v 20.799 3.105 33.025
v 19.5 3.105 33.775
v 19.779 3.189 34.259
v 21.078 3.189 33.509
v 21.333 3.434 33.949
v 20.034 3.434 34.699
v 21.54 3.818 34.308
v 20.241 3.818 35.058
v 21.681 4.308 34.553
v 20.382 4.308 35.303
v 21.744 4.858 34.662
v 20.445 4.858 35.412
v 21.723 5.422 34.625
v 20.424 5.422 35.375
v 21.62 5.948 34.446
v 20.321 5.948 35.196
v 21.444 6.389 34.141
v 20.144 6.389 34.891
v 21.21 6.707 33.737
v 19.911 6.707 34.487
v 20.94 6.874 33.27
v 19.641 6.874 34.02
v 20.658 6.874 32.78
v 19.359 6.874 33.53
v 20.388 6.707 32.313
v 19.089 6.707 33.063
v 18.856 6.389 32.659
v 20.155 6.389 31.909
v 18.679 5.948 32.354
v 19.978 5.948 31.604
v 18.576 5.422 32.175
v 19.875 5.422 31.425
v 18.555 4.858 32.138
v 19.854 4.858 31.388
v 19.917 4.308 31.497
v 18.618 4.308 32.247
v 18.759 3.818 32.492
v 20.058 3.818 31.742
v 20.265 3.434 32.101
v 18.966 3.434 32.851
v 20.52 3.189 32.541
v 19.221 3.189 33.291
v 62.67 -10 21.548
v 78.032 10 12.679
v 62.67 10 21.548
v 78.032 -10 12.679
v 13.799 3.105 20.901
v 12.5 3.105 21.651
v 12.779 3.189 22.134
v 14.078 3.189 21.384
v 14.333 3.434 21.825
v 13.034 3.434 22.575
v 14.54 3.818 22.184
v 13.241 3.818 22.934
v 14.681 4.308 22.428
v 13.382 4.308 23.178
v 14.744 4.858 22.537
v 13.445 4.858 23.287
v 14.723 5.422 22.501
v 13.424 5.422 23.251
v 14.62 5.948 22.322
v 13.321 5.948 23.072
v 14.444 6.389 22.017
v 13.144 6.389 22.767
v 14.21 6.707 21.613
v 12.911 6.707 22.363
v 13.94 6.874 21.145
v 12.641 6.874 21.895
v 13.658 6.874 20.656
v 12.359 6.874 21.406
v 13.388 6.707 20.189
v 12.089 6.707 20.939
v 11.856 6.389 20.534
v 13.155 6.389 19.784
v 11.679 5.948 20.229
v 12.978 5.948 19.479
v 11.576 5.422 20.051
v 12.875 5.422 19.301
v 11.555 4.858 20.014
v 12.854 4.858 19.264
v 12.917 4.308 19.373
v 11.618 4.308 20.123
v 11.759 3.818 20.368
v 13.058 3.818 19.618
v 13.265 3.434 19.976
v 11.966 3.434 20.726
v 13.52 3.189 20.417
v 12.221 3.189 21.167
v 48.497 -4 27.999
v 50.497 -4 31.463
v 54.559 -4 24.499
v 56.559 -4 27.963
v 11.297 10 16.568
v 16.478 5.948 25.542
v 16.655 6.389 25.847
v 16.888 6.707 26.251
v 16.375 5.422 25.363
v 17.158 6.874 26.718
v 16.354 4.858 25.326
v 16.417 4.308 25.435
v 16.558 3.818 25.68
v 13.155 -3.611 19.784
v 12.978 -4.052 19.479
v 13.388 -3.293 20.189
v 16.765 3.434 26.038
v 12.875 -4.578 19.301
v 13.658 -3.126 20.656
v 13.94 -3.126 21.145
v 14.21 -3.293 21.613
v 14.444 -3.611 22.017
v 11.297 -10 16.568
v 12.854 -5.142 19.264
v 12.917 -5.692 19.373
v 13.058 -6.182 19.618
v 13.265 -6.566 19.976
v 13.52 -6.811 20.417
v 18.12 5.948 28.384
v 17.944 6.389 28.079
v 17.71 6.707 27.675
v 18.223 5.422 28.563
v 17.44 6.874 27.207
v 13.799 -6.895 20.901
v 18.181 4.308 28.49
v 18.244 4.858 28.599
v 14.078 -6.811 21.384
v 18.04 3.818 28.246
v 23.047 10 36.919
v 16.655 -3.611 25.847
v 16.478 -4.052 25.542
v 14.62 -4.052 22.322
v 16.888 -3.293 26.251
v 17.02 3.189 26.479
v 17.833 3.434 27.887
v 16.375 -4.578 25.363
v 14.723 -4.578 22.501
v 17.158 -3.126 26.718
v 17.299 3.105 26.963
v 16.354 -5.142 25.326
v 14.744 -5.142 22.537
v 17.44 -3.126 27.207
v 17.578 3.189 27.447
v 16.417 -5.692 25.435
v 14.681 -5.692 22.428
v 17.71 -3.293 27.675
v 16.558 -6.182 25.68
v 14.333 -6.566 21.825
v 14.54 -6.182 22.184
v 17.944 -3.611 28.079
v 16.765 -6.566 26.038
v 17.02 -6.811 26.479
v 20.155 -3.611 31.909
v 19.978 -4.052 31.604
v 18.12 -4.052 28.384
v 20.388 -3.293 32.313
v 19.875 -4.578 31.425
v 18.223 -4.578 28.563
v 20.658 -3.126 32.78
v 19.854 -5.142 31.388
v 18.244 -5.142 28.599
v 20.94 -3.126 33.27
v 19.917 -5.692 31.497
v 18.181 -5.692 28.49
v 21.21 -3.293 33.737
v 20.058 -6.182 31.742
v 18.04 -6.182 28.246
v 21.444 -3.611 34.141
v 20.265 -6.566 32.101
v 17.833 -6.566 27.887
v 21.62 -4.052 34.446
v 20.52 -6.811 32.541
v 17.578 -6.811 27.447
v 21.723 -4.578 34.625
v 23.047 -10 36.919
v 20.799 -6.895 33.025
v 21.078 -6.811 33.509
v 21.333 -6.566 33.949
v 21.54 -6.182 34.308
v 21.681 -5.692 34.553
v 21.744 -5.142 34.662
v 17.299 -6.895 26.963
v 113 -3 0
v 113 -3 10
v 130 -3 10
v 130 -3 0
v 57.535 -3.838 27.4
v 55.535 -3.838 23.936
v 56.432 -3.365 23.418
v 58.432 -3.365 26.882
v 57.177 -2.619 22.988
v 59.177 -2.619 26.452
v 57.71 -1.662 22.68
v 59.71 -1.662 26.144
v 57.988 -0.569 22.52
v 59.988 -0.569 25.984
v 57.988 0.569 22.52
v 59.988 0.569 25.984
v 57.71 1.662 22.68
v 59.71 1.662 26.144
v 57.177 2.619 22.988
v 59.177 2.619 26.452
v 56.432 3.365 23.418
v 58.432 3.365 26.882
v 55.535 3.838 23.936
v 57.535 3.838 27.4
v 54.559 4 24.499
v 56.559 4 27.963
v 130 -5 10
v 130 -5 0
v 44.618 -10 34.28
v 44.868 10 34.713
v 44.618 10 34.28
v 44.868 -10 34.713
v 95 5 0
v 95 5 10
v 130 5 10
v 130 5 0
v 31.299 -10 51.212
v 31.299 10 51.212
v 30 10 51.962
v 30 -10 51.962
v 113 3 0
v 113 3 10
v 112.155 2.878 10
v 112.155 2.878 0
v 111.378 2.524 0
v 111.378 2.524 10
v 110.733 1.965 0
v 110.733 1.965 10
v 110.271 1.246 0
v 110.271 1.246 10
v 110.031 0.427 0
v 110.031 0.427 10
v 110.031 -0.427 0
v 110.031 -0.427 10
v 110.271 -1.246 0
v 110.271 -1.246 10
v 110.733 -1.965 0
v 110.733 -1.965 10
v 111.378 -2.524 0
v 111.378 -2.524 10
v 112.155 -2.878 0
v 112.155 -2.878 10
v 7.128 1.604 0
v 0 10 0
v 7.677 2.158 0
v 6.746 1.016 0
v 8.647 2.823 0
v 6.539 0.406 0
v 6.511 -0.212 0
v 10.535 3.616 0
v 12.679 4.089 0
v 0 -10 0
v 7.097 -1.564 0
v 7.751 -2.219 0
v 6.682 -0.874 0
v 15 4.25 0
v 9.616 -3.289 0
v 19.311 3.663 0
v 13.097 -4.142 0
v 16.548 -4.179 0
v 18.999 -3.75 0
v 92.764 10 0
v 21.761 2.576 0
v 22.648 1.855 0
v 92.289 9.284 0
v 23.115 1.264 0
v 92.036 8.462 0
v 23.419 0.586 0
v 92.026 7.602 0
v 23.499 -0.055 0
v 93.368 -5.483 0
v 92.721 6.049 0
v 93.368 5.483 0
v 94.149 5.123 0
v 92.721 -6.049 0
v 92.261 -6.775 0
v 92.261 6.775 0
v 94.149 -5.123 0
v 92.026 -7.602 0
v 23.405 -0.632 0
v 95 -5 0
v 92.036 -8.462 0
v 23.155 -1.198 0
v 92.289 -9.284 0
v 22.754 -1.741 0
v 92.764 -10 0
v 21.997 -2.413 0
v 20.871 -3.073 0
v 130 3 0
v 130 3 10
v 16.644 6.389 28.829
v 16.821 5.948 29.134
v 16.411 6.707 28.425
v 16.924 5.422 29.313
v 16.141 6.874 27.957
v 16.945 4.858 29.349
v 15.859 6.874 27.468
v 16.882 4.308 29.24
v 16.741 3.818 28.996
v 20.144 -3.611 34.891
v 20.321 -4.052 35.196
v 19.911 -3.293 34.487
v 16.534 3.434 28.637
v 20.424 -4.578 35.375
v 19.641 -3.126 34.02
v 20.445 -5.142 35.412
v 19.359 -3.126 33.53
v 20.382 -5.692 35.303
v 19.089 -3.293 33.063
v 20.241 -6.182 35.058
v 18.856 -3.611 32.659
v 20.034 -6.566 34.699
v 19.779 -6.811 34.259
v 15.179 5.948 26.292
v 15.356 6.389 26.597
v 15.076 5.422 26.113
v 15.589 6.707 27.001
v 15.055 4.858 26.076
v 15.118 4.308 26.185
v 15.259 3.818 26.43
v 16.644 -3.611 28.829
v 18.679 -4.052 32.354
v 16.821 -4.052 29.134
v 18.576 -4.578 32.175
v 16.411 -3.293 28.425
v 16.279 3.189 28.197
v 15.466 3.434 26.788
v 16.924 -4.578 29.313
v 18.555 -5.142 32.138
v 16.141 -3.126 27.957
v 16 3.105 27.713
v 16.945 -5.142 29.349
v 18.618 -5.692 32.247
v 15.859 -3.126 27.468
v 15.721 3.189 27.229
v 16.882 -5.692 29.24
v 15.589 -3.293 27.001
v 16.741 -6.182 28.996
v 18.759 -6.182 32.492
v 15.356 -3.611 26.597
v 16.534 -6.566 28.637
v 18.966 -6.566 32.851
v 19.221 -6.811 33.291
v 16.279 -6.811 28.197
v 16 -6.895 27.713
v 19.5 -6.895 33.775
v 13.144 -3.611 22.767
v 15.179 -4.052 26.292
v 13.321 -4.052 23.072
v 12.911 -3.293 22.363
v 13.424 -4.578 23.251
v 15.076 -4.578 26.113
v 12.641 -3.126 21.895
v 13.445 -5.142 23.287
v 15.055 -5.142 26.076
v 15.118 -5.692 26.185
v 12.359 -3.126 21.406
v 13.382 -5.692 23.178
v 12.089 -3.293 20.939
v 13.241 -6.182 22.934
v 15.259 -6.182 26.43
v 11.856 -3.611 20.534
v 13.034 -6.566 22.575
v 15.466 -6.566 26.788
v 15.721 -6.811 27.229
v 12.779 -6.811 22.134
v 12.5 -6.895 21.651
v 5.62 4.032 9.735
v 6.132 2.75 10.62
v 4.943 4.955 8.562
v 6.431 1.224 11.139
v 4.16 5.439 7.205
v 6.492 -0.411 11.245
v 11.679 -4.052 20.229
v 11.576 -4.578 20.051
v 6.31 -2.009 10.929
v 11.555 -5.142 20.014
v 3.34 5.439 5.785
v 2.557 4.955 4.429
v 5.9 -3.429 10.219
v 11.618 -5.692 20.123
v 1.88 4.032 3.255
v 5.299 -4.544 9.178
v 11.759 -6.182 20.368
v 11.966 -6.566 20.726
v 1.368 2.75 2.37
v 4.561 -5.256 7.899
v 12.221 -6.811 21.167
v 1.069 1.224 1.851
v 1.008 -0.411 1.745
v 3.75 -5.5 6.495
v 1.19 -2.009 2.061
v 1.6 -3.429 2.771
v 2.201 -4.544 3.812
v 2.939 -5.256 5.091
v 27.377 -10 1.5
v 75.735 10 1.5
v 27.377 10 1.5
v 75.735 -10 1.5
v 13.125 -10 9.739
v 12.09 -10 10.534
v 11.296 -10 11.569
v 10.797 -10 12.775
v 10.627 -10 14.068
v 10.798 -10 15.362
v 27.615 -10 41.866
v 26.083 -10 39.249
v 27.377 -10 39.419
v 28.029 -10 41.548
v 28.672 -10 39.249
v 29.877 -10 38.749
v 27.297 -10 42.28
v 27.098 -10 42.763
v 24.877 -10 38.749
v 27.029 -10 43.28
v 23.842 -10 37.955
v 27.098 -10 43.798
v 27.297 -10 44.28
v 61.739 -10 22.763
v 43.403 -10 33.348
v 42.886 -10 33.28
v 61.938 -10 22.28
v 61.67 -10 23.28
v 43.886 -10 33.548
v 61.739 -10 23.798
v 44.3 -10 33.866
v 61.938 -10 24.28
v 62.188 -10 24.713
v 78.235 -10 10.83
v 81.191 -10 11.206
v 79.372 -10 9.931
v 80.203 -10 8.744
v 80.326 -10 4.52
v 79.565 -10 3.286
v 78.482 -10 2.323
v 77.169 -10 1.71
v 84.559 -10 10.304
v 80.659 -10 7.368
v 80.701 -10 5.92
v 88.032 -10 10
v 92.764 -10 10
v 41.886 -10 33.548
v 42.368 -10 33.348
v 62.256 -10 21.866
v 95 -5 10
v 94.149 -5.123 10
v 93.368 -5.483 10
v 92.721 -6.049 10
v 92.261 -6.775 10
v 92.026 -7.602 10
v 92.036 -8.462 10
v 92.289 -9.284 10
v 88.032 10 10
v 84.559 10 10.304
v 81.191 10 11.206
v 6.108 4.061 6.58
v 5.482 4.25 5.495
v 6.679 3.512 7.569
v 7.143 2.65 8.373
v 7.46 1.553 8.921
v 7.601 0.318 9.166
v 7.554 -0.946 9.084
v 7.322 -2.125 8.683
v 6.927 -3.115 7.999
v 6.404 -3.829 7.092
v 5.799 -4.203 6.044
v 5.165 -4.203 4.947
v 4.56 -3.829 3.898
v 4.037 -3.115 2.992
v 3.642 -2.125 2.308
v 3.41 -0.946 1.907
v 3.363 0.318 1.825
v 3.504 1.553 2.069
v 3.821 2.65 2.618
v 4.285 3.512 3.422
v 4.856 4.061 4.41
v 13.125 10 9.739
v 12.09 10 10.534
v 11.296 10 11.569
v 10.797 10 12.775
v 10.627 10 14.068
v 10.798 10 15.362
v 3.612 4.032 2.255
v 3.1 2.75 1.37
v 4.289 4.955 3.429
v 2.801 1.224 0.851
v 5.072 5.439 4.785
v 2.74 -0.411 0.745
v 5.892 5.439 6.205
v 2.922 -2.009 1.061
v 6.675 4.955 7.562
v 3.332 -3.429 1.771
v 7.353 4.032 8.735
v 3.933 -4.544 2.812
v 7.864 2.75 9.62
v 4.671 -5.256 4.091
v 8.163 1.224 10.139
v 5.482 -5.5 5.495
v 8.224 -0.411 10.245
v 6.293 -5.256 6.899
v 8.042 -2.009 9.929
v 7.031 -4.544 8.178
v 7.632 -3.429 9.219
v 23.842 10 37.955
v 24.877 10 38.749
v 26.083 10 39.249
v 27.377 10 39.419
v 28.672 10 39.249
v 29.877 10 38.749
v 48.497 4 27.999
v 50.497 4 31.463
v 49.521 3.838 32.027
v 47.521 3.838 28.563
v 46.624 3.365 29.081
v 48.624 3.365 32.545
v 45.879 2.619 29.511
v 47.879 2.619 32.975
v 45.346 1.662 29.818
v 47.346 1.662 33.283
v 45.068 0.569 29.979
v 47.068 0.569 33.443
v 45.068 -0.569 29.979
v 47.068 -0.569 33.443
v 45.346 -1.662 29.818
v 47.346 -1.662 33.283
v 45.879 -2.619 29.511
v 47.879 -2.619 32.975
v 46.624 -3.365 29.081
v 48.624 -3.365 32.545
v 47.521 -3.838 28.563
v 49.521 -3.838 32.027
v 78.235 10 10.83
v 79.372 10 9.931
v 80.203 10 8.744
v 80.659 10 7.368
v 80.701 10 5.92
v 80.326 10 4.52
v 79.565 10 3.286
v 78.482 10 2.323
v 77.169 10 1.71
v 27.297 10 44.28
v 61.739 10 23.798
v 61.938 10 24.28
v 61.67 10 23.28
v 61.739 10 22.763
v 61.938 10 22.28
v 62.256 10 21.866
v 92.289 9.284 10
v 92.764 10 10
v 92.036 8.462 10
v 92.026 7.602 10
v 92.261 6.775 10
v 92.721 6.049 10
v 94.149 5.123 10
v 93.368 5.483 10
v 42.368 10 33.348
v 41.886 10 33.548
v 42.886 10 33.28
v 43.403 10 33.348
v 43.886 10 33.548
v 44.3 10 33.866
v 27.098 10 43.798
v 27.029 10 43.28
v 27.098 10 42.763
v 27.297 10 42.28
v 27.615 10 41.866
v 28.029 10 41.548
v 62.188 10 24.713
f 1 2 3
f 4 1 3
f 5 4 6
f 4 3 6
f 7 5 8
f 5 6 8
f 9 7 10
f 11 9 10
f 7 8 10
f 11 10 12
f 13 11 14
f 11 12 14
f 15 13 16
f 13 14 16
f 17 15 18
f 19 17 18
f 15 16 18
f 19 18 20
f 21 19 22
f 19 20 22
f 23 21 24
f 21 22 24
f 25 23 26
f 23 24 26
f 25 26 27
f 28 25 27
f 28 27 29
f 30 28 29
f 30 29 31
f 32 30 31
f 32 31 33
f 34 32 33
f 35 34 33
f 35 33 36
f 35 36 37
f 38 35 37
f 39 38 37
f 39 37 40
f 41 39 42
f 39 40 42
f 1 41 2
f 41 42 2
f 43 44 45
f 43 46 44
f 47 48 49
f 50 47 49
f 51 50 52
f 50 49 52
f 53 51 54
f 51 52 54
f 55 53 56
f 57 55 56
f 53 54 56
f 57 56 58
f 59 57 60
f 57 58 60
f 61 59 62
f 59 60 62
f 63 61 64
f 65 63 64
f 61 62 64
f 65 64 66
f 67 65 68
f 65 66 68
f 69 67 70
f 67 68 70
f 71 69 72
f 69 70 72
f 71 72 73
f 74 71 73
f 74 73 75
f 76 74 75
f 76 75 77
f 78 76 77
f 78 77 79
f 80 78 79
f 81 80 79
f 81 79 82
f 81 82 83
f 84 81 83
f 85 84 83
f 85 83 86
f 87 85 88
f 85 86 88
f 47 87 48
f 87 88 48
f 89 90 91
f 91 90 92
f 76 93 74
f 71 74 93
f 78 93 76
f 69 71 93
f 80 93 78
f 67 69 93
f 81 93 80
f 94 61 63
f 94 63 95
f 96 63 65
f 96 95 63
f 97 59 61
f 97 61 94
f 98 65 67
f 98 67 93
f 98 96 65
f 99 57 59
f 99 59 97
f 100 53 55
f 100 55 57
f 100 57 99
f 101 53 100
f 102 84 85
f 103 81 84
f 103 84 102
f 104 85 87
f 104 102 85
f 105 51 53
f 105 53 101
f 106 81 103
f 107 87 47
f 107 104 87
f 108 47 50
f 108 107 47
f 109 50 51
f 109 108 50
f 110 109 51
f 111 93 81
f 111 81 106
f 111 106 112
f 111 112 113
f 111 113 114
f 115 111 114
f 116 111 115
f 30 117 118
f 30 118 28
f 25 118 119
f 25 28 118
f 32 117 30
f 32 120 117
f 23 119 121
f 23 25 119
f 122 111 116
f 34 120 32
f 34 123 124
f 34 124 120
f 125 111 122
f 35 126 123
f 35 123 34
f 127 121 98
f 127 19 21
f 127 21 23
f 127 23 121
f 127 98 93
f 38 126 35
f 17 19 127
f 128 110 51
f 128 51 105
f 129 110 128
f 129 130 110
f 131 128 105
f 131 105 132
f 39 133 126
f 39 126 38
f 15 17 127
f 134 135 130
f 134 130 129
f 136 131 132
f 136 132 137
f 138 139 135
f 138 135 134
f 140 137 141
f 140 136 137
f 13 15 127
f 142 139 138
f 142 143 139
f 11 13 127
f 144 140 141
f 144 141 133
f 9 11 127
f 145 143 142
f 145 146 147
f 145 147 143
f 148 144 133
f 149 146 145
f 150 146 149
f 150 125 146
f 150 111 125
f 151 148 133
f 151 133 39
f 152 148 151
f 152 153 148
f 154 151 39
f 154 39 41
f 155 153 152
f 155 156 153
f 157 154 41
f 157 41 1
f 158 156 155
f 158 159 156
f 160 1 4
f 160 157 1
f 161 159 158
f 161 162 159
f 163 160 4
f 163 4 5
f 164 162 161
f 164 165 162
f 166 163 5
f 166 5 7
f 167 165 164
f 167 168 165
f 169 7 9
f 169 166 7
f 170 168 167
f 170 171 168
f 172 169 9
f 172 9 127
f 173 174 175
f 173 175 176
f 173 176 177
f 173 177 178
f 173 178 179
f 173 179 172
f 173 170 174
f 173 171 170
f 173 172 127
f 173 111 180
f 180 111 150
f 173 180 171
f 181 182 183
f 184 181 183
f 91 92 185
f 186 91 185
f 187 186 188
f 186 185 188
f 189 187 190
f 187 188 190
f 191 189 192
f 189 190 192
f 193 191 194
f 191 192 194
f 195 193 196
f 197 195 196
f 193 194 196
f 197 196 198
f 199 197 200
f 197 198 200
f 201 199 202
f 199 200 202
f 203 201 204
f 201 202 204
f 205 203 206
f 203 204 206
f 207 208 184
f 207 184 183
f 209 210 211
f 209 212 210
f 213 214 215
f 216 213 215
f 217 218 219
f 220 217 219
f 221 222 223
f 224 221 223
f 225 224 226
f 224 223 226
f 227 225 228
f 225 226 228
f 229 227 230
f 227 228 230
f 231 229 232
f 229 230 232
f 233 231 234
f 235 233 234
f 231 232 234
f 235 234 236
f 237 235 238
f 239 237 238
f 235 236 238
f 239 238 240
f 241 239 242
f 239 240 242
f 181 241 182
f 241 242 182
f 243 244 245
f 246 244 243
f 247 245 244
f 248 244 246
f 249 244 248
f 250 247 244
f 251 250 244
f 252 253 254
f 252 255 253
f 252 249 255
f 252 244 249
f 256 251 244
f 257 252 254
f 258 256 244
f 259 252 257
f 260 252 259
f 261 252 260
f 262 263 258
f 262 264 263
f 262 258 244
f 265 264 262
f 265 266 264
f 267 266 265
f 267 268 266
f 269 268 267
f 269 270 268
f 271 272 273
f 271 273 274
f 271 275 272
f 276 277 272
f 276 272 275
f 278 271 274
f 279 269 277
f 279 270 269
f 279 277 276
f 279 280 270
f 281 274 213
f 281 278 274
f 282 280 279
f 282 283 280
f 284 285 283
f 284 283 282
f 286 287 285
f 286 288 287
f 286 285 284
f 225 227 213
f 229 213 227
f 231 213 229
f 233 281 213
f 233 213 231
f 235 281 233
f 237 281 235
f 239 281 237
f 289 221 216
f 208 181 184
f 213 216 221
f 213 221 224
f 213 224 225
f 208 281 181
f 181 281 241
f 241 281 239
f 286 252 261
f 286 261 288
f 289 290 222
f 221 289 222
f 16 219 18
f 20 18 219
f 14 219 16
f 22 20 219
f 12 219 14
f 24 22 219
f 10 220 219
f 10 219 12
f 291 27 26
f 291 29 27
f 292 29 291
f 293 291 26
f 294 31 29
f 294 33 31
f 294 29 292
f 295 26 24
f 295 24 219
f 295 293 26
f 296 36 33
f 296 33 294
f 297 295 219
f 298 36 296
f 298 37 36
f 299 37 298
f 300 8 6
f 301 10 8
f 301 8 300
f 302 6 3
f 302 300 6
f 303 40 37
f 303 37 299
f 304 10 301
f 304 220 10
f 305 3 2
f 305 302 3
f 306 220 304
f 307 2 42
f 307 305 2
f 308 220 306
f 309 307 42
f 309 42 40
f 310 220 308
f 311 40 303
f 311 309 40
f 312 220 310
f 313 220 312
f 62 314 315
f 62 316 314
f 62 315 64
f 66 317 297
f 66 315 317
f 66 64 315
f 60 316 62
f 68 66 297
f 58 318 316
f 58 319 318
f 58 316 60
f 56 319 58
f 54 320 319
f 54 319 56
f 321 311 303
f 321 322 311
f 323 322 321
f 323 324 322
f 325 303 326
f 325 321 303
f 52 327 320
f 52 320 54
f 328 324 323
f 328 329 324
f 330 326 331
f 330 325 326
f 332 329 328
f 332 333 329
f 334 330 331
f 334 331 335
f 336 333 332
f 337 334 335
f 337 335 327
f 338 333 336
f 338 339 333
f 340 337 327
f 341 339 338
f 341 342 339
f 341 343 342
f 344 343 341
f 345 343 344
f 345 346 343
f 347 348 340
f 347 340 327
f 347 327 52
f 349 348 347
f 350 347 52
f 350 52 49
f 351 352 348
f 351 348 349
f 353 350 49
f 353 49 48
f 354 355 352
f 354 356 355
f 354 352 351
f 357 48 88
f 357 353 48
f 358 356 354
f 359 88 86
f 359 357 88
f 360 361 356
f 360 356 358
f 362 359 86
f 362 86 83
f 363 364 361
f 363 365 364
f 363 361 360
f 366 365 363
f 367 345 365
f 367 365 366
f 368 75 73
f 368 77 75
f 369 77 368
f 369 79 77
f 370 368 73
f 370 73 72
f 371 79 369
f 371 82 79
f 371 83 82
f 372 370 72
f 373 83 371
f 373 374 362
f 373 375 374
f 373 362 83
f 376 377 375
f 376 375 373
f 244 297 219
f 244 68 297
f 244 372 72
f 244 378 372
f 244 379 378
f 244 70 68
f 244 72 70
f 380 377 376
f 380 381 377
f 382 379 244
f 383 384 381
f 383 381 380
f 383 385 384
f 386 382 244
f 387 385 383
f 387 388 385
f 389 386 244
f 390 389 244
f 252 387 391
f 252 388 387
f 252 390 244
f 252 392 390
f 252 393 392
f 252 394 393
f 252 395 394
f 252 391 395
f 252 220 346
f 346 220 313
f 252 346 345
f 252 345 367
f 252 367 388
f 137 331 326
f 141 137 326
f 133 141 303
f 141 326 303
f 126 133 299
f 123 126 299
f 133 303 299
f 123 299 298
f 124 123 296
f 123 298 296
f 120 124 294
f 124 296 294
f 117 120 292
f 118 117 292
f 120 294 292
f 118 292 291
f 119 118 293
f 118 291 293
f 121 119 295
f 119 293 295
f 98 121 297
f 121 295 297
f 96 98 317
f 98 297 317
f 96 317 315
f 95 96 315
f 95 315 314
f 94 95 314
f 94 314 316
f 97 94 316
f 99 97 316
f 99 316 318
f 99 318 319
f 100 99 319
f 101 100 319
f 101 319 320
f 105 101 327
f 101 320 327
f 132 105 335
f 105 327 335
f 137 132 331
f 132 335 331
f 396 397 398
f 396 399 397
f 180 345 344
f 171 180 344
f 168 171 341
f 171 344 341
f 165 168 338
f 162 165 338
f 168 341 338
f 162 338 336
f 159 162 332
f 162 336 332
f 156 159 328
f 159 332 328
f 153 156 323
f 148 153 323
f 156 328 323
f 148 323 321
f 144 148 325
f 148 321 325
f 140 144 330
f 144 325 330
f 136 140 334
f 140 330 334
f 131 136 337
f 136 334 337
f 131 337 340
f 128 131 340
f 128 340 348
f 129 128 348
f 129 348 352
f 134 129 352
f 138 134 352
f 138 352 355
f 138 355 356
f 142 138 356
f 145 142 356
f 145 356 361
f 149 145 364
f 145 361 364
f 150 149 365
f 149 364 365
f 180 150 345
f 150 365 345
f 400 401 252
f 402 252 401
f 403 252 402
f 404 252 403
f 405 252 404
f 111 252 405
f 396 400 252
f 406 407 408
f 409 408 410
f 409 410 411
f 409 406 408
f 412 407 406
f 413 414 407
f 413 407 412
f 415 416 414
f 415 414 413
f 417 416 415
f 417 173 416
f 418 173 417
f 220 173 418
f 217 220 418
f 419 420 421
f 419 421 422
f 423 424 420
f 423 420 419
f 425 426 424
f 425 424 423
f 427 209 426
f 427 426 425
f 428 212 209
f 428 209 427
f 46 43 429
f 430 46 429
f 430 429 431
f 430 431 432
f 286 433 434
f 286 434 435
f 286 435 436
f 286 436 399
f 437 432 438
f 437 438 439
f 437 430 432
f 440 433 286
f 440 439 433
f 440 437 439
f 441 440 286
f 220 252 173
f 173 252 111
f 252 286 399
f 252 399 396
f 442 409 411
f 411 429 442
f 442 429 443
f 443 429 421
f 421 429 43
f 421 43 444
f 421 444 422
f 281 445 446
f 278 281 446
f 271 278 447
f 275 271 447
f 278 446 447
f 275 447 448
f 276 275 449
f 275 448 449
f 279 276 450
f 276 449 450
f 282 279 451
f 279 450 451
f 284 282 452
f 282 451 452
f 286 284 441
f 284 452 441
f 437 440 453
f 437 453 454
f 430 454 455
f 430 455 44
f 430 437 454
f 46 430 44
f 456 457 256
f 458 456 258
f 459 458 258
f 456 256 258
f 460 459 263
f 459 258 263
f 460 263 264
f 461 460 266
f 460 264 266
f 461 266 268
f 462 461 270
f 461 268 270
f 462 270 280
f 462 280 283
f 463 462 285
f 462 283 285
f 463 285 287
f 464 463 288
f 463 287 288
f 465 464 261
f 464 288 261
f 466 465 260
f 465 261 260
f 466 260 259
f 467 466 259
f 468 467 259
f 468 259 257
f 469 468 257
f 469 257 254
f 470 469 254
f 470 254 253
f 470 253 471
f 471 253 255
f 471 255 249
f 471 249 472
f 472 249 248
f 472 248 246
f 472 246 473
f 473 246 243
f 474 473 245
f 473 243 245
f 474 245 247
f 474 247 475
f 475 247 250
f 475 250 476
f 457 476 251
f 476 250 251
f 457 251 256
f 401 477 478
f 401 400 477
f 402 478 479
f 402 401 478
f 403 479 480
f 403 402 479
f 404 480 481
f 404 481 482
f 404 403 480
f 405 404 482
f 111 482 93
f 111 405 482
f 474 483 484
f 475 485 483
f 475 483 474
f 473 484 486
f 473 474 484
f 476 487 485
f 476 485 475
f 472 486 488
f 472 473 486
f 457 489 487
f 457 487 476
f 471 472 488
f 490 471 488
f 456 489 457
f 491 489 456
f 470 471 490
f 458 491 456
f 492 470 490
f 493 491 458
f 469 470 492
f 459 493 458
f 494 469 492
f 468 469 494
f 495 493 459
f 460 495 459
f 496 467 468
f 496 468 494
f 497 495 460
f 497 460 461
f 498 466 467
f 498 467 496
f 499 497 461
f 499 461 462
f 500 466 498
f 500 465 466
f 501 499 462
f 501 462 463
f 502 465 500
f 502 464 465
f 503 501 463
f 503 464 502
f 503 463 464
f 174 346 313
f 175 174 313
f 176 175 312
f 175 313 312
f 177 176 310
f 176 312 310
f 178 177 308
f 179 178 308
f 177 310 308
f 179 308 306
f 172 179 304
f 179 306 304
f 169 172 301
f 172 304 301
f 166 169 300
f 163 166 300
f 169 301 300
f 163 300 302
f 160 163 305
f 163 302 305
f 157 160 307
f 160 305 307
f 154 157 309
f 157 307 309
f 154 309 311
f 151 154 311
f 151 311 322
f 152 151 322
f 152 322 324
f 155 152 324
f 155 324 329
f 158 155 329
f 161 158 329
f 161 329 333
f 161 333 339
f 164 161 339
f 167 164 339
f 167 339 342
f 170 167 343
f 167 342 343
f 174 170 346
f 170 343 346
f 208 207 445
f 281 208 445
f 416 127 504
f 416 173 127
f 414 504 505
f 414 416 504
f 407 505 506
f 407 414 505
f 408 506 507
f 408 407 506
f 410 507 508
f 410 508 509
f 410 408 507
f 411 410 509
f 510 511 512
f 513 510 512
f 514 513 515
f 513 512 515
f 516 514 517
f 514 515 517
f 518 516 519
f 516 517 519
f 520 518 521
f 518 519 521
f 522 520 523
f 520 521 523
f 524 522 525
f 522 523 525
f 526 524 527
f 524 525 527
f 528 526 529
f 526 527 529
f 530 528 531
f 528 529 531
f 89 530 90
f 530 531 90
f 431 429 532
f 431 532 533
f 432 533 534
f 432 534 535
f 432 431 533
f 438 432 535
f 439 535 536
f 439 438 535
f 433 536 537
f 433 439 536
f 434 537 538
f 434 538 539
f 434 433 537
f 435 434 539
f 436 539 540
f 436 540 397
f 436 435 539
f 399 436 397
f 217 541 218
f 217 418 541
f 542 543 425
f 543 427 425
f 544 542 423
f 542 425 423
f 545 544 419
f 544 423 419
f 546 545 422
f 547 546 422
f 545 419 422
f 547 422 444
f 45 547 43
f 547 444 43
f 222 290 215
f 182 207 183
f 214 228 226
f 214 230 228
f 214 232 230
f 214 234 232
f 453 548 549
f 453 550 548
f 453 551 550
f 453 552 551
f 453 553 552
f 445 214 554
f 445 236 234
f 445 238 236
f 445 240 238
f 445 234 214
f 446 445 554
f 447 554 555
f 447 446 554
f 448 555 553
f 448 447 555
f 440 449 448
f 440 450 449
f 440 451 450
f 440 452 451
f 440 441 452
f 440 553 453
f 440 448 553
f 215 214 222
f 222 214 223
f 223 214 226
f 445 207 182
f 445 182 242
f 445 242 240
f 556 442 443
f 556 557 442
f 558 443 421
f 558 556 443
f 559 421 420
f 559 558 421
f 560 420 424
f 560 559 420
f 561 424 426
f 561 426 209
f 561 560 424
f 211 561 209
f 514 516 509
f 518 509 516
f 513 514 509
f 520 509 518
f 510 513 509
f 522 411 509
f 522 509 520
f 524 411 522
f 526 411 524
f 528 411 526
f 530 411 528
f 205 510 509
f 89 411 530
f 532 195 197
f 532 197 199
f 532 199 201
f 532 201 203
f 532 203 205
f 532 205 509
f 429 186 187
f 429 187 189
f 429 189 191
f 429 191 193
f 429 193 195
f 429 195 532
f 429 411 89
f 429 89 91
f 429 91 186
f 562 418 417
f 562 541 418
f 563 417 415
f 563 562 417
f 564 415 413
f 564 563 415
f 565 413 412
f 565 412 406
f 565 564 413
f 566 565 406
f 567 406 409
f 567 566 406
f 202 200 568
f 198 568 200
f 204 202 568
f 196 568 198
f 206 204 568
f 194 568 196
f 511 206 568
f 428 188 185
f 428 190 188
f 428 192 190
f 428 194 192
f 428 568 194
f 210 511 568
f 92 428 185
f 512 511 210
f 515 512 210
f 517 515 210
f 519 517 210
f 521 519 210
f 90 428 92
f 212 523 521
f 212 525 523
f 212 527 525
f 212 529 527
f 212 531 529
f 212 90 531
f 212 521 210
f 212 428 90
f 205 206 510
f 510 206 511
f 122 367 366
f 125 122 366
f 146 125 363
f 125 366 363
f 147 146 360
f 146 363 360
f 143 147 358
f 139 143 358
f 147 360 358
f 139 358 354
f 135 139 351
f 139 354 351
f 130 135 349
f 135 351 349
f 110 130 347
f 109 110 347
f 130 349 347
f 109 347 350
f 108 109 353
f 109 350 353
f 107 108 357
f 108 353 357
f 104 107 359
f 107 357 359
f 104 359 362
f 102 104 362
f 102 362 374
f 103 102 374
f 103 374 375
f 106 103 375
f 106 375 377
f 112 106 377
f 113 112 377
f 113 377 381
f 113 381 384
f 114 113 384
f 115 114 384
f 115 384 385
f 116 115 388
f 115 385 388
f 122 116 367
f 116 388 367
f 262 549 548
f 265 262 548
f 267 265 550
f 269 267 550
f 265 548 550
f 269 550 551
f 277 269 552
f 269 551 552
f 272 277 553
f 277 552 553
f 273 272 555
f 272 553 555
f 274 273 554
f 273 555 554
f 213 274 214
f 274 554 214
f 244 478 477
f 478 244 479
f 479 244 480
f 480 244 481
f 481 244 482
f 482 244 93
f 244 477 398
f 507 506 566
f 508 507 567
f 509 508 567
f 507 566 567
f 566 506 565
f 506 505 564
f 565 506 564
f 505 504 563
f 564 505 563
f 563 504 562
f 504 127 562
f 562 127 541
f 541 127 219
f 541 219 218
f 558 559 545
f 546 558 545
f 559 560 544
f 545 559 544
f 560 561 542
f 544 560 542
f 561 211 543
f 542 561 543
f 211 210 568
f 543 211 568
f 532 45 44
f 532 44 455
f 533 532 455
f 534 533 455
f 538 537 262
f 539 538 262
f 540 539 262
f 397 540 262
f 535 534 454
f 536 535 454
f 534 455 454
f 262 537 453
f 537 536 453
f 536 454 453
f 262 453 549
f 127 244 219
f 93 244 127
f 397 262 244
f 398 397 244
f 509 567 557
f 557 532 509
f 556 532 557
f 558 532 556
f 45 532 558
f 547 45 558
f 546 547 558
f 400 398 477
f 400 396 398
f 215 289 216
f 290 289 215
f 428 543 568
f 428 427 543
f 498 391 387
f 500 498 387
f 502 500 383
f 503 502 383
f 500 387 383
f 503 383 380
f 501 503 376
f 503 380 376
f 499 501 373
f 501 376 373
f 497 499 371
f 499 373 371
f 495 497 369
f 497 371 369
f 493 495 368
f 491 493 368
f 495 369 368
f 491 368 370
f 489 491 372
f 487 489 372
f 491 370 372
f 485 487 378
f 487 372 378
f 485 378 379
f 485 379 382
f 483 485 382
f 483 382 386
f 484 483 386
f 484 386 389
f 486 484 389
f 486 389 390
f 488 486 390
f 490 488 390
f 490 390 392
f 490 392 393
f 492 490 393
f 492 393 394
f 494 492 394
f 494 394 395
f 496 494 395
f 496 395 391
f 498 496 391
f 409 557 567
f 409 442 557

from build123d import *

# Parameters (mm, degrees)
F1_DEPTH       = 10
F3_DEPTH       = 10.001
F5_D           = 8.5
F5_CBORE_D     = 11
F5_CBORE_DEPTH = 2
F4_R           = 1.895
F6_DEPTH       = 1.5
F7_R           = 2
F9_DEPTH       = 4


with BuildPart() as f1:
    # F0 (on Front) → F1 (new body, symmetric)
    with BuildSketch(Plane.XZ):
        with BuildLine():
            Line((30, 51.9615242271), (0, 0))
            Line((0, 0), (130, 0))
            Line((130, 0), (130, 10))
            Line((130, 10), (88.031548244, 10))
            ThreePointArc((88.031548244, 10), (82.855167342, 10.6814834742), (78.031548244, 12.6794919243))
            Line((78.031548244, 12.6794919243), (60.9383223748, 22.5482704812))
            Line((60.9383223748, 22.5482704812), (62.1883223748, 24.7133339907))
            Line((62.1883223748, 24.7133339907), (44.8678142991, 34.7133339907))
            Line((44.8678142991, 34.7133339907), (43.6178142991, 32.5482704812))
            Line((43.6178142991, 32.5482704812), (26.2973062234, 42.5482704812))
            Line((26.2973062234, 42.5482704812), (31.2990381057, 51.2115242271))
            Line((31.2990381057, 51.2115242271), (30, 51.9615242271))
        make_face()
        with BuildLine():
            ThreePointArc((78.2347422219, 10.8301270189), (80.5643713533, 5.2059047745), (75.7347422219, 1.5))
            Line((75.7347422219, 1.5), (27.3774332424, 1.5))
            Line((27.3774332424, 1.5), (13.1251234055, 9.7387149337))
            ThreePointArc((13.1251234055, 9.7387149337), (10.7974587698, 12.7747007163), (11.2973058678, 16.5675077516))
            Line((11.2973058678, 16.5675077516), (23.0473062234, 36.9191053566))
            ThreePointArc((23.0473062234, 36.9191053566), (26.0833380169, 39.2487344881), (29.8774332424, 38.7492323755))
            Line((29.8774332424, 38.7492323755), (78.2347422219, 10.8301270189))
        make_face(mode=Mode.SUBTRACT)
    extrude(amount=F1_DEPTH, both=True)

    # F2 (on face) → F3 (cut, through all)
    with BuildSketch(Plane.XY.offset(10)):
        with BuildLine():
            Line((130, -10), (130, -5))
            Line((130, -5), (95, -5))
            ThreePointArc((95, -5), (92.2613872125, -6.7752551286), (92.7639320225, -10))
            Line((92.7639320225, -10), (130, -10))
        make_face()
        with BuildLine():
            ThreePointArc((92.7639320225, 10), (92.2613872125, 6.7752551286), (95, 5))
            Line((95, 5), (130, 5))
            Line((130, 5), (130, 10))
            Line((130, 10), (92.7639320225, 10))
        make_face()
        with BuildLine():
            Line((130, -3), (130, 3))
            Line((130, 3), (113, 3))
            ThreePointArc((113, 3), (110, 0), (113, -3))
            Line((113, -3), (130, -3))
        make_face()
    extrude(amount=-F3_DEPTH, mode=Mode.SUBTRACT)

    # F5 (through all)
    with Locations(Plane(origin=(0, 0, 0), x_dir=(0, -1, 0), z_dir=(-0.8660254038, 0, 0.5))):
        with Locations((0, 7.5)):
            CounterBoreHole(F5_D / 2, F5_CBORE_D / 2, F5_CBORE_DEPTH)

    # F4 (on face) → F6 (cut, through all)
    with BuildSketch(Plane(origin=(0, 0, 0), x_dir=(0, -1, 0), z_dir=(-0.8660254038, 0, 0.5))):
        with Locations((-5, 39)):
            Circle(F4_R)
        with Locations((5, 39)):
            Circle(F4_R)
        with Locations((-5, 32)):
            Circle(F4_R)
        with Locations((5, 32)):
            Circle(F4_R)
        with Locations((-5, 25)):
            Circle(F4_R)
        with Locations((5, 25)):
            Circle(F4_R)
    extrude(amount=-F6_DEPTH, mode=Mode.SUBTRACT)

    # F7
    f7_edges = [f1.edges().sort_by_distance(p)[0] for p in [
        (43.617814, 0, 32.54827),
        (60.938322, 0, 22.54827),
        (26.297306, 0, 42.54827),
    ]]
    fillet(f7_edges, radius=F7_R)

    # F8 (on face) → F9 (cut, through all)
    with BuildSketch(Plane(origin=(26.2482681178, 0, 45.4633339907), x_dir=(0.8660254038, 0, -0.5), z_dir=(0.5, 0, 0.8660254038))):
        with BuildLine():
            ThreePointArc((28, 4), (24, 0), (28, -4))
            Line((28, -4), (35, -4))
            ThreePointArc((35, -4), (39, 0), (35, 4))
            Line((35, 4), (28, 4))
        make_face()
    extrude(amount=-F9_DEPTH, mode=Mode.SUBTRACT)


solid = f1.part
